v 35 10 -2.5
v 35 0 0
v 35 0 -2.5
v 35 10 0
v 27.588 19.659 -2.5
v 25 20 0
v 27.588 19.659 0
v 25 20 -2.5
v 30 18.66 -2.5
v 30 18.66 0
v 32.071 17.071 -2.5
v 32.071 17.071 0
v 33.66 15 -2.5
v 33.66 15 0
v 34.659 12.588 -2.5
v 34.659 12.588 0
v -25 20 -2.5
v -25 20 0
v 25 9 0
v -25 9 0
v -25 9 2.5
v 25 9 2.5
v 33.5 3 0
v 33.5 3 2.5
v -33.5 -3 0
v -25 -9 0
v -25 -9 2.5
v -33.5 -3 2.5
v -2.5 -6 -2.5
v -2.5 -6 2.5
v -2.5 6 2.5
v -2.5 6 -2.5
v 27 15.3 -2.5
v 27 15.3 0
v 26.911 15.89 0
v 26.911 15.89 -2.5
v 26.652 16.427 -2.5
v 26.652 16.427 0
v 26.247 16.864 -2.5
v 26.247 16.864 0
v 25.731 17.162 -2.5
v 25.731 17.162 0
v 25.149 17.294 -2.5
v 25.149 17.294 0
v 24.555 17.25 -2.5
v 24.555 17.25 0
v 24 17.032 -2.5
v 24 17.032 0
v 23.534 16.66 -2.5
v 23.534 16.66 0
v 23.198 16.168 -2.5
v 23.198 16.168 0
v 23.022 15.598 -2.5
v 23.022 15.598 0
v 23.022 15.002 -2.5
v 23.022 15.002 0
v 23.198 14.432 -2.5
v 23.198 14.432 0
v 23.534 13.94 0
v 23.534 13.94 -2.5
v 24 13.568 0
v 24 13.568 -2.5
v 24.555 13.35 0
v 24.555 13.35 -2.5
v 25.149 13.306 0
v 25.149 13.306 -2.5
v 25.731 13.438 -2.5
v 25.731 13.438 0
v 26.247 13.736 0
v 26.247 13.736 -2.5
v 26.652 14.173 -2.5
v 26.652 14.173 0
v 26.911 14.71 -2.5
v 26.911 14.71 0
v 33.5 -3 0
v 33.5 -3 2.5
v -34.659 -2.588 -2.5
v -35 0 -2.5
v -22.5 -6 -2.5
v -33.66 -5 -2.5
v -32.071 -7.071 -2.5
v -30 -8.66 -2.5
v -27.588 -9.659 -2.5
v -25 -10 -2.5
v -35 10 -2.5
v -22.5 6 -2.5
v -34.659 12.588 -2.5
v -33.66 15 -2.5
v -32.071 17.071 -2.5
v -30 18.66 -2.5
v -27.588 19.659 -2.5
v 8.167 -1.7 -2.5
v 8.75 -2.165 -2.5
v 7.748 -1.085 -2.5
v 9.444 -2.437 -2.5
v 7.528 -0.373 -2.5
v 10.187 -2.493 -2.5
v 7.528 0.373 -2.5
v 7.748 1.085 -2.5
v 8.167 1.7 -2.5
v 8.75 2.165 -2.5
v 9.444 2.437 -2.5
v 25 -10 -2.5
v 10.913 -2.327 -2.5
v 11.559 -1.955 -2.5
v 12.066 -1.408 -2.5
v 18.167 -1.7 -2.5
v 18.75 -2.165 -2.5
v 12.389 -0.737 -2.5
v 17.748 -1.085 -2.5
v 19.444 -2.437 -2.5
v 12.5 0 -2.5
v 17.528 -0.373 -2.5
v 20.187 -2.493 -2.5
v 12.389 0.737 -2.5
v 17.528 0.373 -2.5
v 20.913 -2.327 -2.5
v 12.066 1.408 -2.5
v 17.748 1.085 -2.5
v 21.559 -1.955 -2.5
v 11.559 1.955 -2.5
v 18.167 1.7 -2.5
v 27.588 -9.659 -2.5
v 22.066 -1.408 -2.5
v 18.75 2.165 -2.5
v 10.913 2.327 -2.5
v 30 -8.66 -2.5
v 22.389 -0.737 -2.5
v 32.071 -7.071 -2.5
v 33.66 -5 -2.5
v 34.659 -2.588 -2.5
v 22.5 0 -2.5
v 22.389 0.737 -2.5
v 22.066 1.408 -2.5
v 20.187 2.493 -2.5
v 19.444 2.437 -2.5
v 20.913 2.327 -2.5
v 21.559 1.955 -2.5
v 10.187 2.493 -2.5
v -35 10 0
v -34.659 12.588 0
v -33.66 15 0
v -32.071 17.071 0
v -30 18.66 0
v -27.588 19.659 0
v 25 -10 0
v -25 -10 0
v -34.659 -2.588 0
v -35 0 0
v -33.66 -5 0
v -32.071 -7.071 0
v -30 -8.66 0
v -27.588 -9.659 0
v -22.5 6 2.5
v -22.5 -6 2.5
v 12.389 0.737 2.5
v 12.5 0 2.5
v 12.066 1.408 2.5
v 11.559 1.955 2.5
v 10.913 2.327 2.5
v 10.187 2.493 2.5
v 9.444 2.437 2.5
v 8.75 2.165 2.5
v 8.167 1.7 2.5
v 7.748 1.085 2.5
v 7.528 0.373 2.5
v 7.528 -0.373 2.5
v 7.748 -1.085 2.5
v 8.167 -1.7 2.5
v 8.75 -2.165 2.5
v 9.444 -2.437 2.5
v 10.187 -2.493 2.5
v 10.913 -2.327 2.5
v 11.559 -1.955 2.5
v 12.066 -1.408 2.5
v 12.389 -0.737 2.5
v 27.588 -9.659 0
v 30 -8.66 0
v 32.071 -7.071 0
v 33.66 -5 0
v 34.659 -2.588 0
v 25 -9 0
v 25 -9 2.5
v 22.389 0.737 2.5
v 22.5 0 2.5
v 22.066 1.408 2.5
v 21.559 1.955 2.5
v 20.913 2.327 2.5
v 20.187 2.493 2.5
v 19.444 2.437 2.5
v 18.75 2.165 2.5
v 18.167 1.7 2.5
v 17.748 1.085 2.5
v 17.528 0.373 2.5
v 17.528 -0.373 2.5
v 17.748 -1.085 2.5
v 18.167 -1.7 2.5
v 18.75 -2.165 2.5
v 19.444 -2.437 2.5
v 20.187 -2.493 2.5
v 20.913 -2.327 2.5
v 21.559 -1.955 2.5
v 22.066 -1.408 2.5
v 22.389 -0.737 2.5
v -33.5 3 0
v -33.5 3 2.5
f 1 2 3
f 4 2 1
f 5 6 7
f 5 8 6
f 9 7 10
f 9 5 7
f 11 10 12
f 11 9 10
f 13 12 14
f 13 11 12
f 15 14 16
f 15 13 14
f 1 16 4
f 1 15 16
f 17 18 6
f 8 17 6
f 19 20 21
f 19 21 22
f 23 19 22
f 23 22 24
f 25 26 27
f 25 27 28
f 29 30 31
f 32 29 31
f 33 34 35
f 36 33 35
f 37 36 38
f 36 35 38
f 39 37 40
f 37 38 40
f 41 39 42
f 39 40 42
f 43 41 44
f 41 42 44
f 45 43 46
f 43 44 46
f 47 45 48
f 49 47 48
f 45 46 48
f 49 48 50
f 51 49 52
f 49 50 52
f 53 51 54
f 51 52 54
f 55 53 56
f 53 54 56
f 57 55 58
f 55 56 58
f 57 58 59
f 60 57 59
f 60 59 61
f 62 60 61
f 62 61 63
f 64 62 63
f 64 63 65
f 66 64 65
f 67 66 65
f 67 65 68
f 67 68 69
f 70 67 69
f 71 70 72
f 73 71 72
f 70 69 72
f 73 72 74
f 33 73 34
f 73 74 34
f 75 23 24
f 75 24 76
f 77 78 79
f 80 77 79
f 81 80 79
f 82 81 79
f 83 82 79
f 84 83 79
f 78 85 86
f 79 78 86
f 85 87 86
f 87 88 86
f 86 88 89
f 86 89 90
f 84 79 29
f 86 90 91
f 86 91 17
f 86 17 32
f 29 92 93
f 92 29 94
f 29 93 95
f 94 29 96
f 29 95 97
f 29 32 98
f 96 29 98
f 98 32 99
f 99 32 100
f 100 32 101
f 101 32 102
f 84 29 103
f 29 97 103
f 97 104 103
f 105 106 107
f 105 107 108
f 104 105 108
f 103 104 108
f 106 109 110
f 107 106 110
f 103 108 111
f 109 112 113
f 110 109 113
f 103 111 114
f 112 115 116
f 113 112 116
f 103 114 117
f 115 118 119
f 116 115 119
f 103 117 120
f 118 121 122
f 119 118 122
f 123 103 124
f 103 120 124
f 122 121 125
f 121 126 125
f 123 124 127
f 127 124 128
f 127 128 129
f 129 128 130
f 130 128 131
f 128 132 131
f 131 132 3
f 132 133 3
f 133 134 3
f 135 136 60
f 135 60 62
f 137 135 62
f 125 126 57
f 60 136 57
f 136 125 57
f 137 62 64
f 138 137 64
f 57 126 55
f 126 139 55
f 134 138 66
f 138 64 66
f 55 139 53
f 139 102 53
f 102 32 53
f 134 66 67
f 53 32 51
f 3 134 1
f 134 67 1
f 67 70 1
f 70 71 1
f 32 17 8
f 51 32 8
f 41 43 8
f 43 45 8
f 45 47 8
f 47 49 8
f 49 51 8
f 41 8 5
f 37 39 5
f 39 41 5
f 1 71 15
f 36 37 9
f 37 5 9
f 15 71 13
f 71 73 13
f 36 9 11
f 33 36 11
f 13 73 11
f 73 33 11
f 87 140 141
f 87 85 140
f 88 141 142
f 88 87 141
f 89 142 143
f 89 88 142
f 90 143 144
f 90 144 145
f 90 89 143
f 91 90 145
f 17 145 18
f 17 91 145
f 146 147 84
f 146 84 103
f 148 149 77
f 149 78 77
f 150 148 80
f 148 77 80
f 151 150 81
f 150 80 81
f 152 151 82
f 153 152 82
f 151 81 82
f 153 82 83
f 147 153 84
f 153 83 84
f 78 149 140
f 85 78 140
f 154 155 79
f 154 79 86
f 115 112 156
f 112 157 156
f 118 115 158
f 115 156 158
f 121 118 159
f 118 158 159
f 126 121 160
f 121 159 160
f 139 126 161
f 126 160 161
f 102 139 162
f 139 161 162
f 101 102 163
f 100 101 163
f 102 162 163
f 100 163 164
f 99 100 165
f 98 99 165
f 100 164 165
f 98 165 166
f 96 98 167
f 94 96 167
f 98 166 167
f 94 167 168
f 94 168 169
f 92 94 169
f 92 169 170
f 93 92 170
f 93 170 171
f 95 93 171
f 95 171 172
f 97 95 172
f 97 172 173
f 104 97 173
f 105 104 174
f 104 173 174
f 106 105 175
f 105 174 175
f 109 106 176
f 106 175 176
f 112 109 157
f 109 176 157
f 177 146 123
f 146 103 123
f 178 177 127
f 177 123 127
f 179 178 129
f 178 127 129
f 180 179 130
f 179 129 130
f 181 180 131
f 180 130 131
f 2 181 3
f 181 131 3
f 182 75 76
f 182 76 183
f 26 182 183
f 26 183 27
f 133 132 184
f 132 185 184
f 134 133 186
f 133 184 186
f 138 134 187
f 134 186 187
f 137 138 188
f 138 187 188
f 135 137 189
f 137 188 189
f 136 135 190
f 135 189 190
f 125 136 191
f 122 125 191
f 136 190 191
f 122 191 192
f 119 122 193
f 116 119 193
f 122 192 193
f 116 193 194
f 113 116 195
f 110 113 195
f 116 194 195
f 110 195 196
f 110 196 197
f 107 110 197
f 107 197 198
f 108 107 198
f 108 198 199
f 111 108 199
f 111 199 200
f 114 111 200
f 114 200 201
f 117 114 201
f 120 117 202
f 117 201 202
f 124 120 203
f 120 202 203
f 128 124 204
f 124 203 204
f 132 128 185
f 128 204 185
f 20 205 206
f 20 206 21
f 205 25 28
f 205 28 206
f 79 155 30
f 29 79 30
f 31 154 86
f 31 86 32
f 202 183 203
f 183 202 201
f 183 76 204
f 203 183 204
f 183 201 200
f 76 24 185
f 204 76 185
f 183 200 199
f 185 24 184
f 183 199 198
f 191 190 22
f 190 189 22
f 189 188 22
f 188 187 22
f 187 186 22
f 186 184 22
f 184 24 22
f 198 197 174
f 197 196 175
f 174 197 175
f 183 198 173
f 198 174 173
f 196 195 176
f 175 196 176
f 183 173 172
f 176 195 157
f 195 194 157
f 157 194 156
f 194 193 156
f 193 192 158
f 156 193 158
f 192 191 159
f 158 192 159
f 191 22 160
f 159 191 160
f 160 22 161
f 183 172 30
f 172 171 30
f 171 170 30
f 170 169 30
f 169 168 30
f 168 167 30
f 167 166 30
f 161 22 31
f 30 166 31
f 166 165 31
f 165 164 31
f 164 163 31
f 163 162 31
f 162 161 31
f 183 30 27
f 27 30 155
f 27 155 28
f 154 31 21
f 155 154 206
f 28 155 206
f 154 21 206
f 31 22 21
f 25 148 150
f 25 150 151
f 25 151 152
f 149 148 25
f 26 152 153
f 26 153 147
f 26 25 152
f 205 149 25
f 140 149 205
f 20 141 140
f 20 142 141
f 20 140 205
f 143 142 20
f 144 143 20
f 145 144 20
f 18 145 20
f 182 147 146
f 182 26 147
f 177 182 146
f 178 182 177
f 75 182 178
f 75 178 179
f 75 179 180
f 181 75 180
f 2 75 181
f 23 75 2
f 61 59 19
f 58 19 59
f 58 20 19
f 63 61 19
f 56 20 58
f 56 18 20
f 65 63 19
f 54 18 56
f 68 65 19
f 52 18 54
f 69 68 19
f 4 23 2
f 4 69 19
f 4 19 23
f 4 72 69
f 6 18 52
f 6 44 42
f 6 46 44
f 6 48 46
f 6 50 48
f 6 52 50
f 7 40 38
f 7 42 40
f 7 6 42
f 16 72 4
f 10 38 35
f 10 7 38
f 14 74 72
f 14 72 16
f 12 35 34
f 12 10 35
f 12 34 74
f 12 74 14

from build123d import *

# Parameters (mm, degrees)
BOSS_EXTRUDE1_DEPTH     = 2.5
SKETCH2_W               = 70
SKETCH2_H               = 30
BOSS_EXTRUDE2_DEPTH     = 2.5
SKETCH3_R               = 2
CUT_EXTRUDE1_DEPTH      = 2.5
FILLET1_R               = 10
SKETCH4_R               = 2.5
SKETCH4_W               = 20
SKETCH4_H               = 12
CUT_EXTRUDE2_DEPTH      = 3.5
CUT_EXTRUDE2_DEPTH_BACK = 3.5


with BuildPart() as part:
    # Sketch1 → Boss-Extrude1 (new body)
    with BuildSketch(Plane.XY):
        Polygon((-33.5, 3), (-25, 9), (25, 9), (33.5, 3), (33.5, -3), (25, -9), (-25, -9), (-33.5, -3), align=None)
    extrude(amount=BOSS_EXTRUDE1_DEPTH)

    # Sketch2 → Boss-Extrude2 (add)
    with BuildSketch(Plane.XY):
        with Locations((0, 5)):
            Rectangle(SKETCH2_W, SKETCH2_H)
    extrude(amount=-BOSS_EXTRUDE2_DEPTH)

    # Sketch3 → Cut-Extrude1 (cut)
    with BuildSketch(Plane.XY):
        with Locations((25, 15.3)):
            Circle(SKETCH3_R)
    extrude(amount=-CUT_EXTRUDE1_DEPTH, mode=Mode.SUBTRACT)

    # Fillet1
    fillet1_edges = [part.edges().sort_by_distance(p)[0] for p in [
        (35, 20, -1.25),
        (35, -10, -1.25),
        (-35, -10, -1.25),
        (-35, 20, -1.25),
    ]]
    fillet(fillet1_edges, radius=FILLET1_R)

    # Sketch4 → Cut-Extrude2 (cut, two sides)
    with BuildSketch(Plane.XY) as cut_extrude2_sk:
        with Locations((10, 0)):
            Circle(SKETCH4_R)
        with Locations((20, 0)):
            Circle(SKETCH4_R)
        with Locations((-12.5, 0)):
            Rectangle(SKETCH4_W, SKETCH4_H)
    extrude(amount=CUT_EXTRUDE2_DEPTH, mode=Mode.SUBTRACT)
    extrude(cut_extrude2_sk.sketch, amount=-CUT_EXTRUDE2_DEPTH_BACK, mode=Mode.SUBTRACT)


solid = part.part
